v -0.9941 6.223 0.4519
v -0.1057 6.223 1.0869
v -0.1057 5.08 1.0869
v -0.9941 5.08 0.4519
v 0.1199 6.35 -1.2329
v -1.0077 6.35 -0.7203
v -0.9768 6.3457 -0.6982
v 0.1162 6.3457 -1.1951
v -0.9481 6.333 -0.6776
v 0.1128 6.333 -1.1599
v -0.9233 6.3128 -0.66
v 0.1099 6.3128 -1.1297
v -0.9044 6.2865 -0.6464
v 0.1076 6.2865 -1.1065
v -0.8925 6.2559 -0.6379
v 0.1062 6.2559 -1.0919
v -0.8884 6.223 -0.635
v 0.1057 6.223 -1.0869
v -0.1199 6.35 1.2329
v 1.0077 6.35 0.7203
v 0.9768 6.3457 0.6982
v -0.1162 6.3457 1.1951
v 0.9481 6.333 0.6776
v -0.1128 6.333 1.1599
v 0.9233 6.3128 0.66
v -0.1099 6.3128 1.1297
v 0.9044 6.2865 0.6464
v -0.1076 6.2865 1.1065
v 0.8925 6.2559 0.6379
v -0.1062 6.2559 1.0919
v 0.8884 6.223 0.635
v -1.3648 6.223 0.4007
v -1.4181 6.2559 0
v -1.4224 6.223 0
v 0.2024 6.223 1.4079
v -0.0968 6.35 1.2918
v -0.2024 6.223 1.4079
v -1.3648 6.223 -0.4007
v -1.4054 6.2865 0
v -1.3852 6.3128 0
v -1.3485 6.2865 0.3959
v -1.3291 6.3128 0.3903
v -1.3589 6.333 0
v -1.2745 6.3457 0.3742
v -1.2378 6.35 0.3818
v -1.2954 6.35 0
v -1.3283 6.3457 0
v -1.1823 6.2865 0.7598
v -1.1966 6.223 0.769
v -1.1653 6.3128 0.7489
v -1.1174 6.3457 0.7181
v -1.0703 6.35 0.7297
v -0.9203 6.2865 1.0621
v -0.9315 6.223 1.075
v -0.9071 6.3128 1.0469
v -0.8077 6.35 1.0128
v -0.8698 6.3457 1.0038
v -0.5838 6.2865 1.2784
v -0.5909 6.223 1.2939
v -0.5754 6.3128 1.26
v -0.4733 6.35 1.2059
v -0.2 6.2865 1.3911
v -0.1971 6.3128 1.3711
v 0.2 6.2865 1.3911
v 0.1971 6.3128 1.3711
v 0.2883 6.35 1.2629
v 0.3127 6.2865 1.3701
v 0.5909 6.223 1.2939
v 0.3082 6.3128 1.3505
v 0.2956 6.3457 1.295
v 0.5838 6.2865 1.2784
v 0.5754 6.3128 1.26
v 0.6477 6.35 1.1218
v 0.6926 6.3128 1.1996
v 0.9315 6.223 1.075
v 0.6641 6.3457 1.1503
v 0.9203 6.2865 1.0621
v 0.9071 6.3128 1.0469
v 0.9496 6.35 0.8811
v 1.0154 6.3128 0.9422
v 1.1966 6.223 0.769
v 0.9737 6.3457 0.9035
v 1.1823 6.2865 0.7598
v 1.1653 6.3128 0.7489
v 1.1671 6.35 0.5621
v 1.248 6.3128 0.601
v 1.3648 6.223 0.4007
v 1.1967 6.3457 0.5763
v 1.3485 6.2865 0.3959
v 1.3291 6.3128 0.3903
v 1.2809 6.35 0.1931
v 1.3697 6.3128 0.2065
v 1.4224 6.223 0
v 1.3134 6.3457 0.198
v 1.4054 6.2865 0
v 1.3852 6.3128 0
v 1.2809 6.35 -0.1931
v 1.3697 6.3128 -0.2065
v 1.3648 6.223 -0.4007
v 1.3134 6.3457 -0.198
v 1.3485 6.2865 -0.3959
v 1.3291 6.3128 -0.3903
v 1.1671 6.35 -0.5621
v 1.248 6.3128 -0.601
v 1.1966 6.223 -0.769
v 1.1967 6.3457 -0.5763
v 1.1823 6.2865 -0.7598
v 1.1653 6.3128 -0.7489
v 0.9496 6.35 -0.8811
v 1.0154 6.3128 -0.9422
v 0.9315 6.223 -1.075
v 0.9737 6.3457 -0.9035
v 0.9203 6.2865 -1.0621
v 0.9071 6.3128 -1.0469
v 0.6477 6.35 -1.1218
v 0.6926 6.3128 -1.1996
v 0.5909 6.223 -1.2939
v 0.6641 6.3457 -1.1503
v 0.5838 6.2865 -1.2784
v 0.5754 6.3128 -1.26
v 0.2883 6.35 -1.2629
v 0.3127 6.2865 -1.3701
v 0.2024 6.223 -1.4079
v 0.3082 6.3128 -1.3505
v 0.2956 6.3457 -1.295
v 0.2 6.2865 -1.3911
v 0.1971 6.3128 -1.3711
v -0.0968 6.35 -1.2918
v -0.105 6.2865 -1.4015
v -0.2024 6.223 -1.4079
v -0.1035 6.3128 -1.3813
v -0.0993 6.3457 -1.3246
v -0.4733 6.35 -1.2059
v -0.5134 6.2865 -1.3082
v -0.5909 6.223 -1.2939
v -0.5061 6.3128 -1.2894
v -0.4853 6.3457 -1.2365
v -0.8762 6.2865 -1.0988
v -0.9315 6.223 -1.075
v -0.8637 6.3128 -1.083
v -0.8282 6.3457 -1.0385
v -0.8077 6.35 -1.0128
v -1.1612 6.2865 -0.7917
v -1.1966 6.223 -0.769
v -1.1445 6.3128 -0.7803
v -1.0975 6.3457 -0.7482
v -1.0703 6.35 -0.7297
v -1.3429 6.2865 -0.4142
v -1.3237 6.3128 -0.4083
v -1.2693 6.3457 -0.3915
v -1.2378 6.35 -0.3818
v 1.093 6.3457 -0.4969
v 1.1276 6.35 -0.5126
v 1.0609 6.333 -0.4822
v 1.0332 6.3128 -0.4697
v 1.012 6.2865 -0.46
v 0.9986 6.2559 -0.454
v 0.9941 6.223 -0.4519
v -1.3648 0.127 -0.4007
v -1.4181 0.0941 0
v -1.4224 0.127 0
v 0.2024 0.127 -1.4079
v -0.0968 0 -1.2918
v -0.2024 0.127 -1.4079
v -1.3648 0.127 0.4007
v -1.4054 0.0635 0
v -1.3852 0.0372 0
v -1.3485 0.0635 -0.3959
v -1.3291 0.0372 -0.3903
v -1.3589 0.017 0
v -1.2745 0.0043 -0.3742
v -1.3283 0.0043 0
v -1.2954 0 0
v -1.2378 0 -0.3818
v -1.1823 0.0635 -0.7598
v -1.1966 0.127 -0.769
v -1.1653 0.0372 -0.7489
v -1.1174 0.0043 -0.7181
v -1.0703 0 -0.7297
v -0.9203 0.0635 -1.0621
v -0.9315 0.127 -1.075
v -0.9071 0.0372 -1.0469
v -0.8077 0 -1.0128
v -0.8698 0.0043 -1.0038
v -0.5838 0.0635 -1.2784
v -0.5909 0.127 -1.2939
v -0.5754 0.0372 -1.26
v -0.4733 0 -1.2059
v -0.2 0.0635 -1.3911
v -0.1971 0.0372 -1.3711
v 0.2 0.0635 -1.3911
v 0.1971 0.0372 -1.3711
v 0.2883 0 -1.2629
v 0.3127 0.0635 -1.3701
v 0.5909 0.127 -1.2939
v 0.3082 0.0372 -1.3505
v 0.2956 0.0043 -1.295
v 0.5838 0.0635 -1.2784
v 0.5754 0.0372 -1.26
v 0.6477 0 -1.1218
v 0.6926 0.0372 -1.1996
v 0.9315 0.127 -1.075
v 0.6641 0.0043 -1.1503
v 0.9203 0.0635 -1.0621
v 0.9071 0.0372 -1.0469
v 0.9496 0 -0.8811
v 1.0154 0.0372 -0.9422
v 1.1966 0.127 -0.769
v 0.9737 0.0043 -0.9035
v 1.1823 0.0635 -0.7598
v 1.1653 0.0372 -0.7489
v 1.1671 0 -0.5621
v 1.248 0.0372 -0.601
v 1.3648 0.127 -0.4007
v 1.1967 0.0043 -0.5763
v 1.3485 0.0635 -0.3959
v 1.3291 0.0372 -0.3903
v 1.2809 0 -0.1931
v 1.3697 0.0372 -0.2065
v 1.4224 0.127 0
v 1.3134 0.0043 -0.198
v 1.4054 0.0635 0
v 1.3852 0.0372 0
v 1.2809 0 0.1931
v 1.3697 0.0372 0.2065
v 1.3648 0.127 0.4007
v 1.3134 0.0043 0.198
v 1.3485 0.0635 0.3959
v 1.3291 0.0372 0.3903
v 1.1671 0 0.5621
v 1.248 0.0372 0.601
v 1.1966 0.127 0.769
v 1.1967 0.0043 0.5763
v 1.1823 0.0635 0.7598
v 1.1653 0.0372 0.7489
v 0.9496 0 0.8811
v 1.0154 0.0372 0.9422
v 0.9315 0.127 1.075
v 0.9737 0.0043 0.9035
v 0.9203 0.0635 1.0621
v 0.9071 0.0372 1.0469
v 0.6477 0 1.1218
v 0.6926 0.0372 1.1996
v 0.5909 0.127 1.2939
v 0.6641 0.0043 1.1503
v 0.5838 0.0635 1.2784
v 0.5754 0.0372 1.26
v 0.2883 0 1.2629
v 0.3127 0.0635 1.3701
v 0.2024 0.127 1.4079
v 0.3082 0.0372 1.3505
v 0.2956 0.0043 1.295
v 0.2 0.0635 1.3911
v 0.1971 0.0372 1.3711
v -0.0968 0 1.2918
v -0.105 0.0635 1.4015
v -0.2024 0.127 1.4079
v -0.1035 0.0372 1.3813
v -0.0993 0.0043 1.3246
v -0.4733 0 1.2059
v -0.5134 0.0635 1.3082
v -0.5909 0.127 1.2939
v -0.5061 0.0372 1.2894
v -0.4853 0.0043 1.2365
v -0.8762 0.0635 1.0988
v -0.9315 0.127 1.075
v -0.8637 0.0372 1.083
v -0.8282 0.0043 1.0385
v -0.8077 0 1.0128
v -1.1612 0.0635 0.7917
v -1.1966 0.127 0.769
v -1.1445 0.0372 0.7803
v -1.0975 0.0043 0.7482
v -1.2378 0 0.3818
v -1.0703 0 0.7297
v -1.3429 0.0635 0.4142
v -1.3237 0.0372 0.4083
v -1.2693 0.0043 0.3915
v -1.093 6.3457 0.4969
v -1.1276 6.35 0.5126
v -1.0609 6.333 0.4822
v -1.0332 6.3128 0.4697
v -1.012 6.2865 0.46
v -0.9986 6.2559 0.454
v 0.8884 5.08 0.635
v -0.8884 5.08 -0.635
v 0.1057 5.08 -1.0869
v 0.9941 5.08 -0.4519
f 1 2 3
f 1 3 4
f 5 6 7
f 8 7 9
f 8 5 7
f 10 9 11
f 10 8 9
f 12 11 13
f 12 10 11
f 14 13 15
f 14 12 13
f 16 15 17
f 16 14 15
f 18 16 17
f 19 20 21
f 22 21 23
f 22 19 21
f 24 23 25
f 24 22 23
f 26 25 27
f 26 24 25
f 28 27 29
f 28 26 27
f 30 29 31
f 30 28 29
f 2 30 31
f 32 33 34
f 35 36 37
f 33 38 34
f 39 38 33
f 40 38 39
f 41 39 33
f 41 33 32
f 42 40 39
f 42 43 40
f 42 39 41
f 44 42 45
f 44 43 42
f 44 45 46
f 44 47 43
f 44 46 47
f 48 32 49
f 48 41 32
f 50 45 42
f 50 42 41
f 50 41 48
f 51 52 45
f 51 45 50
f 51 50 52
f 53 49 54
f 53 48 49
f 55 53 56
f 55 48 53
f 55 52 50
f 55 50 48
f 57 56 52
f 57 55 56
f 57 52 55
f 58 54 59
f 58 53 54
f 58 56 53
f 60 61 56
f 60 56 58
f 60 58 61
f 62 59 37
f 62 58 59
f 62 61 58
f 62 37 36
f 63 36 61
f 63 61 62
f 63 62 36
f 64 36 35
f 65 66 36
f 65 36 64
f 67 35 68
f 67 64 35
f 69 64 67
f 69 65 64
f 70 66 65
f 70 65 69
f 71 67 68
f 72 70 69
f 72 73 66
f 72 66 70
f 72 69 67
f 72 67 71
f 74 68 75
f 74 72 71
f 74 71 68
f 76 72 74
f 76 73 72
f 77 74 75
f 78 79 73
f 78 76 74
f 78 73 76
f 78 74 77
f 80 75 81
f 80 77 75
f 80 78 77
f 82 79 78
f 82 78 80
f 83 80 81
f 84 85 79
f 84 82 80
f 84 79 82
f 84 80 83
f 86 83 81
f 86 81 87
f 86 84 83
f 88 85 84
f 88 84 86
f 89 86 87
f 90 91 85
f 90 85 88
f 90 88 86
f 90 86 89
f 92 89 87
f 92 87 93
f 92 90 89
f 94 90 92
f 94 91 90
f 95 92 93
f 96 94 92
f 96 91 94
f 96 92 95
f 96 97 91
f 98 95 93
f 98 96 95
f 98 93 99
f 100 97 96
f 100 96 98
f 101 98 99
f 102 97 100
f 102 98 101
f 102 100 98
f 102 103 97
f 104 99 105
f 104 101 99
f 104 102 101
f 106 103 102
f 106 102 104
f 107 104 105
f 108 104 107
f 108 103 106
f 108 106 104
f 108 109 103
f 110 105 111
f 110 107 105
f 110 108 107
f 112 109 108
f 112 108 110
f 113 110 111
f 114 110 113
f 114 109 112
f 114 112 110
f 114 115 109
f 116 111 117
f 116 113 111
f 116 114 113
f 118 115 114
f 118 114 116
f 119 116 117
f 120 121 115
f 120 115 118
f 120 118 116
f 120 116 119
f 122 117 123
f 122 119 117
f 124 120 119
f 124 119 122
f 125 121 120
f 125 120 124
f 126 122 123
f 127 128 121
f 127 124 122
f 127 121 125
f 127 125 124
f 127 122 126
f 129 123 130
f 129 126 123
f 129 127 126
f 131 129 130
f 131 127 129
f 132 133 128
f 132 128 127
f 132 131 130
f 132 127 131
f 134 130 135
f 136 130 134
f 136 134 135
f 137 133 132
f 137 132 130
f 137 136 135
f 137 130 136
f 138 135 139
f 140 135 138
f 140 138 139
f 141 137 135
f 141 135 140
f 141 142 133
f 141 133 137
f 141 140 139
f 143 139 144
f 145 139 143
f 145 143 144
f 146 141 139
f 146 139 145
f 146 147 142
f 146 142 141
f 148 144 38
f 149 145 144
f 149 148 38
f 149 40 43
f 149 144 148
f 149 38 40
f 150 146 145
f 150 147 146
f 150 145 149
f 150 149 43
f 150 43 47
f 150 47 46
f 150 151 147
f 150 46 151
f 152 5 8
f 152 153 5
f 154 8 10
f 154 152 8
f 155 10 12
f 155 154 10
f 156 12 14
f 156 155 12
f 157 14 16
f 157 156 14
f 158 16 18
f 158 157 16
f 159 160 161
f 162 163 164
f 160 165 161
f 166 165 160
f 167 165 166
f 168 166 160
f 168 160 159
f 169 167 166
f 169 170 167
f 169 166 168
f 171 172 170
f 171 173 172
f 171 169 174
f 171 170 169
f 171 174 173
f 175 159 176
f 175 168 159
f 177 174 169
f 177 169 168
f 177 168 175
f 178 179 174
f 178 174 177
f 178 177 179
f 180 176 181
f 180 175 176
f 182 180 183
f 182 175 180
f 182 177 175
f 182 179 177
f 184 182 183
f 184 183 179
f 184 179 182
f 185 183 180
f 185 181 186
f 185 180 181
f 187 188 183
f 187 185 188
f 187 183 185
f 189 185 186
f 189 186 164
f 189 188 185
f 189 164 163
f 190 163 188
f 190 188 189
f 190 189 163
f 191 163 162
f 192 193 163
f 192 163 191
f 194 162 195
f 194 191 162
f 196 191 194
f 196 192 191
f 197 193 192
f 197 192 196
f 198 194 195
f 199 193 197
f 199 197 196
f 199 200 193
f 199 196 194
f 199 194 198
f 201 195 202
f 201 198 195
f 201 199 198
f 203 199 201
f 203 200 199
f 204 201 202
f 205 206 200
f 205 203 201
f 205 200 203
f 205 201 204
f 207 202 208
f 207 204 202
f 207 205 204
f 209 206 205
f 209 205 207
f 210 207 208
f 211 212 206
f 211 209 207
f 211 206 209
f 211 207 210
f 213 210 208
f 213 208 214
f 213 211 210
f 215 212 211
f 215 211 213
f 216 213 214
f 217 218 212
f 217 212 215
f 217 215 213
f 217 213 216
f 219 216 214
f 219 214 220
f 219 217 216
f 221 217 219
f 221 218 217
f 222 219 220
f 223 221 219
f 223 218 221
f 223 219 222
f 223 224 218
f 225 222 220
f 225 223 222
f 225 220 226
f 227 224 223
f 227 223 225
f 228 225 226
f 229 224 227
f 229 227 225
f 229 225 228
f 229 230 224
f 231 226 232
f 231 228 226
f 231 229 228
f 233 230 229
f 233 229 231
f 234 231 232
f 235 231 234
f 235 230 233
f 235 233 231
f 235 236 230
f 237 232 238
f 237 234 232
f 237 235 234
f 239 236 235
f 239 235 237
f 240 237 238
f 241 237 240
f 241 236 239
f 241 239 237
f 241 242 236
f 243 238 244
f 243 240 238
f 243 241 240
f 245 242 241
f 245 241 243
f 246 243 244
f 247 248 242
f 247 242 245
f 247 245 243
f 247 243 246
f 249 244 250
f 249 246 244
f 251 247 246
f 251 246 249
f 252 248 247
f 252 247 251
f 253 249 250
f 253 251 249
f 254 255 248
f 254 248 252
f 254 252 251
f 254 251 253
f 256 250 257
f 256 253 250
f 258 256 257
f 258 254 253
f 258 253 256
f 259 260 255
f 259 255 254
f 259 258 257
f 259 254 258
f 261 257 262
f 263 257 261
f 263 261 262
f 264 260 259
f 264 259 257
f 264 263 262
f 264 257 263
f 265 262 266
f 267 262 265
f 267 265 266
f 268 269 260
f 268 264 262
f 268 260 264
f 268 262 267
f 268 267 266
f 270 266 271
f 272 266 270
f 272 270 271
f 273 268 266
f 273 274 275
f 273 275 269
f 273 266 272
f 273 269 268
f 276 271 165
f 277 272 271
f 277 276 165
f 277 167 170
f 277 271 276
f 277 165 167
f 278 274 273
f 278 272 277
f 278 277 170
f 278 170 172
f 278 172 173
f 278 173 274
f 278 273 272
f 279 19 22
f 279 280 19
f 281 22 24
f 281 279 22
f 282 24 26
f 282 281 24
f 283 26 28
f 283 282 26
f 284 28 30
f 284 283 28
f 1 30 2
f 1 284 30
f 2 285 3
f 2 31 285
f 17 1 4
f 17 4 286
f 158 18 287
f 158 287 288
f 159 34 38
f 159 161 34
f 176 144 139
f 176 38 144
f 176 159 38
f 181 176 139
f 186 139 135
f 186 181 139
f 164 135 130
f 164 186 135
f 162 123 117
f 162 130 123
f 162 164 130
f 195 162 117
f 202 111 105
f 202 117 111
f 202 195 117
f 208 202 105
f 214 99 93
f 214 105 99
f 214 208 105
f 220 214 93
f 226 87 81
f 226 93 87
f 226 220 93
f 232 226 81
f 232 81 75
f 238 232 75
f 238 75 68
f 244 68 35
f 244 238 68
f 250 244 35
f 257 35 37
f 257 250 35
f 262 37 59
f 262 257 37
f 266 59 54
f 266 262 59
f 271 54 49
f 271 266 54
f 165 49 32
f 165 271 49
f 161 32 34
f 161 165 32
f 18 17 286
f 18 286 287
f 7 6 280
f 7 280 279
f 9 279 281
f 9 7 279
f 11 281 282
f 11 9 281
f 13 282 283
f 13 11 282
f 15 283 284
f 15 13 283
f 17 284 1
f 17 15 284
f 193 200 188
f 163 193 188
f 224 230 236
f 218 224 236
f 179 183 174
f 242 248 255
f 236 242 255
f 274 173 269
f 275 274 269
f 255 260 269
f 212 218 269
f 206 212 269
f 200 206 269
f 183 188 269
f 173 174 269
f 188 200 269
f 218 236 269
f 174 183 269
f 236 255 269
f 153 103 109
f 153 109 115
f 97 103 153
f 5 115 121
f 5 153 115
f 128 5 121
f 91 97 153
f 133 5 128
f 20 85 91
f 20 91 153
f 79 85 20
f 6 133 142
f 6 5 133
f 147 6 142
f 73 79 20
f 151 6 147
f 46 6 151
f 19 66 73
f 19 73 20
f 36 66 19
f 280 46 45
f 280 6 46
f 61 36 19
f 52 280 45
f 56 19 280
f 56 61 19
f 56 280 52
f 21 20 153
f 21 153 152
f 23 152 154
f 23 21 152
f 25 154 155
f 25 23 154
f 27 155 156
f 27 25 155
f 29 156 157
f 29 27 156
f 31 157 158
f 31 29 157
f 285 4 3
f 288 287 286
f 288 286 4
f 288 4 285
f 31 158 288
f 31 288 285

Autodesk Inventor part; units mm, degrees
ref_plane "YZ Plane" through (0, 0, 0) normal (1, 0, 0) x (0, 1, 0)
ref_plane "XZ Plane" through (0, 0, 0) normal (0, 1, 0) x (-1, 0, 0)
ref_plane "XY Plane" through (0, 0, 0) normal (0, 0, 1) x (1, 0, 0)
sketch "Sketch4" plane through (0, 0, 0) normal (0, 1, 0) x (-1, 0, 0)
  circle A0 centre (0, 0) radius 1.4224
  dimension "d14" = 2.8448
extrude "Extrusion4" add sketch "Sketch4" along normal blind 6.35
thread "Thread2" size "4-40 UNC" class "2A" standard "ANSI Unified Screw Threads" full length
fillet "Fillet1" radius 0.127 1 edges at (1.4224, 0, 0)
sketch "Sketch5" plane through (0, 6.35, 0) normal (0, 1, 0) x (1, 0, 0)
  line L0 (-0.8884, 0.635) -> (0.1057, 1.0869)
  line L1 (0.1057, 1.0869) -> (0.9941, 0.4519)
  line L2 (0.9941, 0.4519) -> (0.8884, -0.635)
  line L3 (0.8884, -0.635) -> (-0.1057, -1.0869)
  line L4 (-0.1057, -1.0869) -> (-0.9941, -0.4519)
  line L5 (-0.9941, -0.4519) -> (-0.8884, 0.635)
  point P0 (0, 0)
  point P1 (0, 0)
  dimension "d20" = 1.27
extrude "Extrusion5" cut sketch "Sketch5" against normal blind 1.27
fillet "Fillet2" radius 0.127 1 edges at (1.4224, 6.35, 0)
fillet "Fillet3" radius 0.127 6 edges at (0.5499, 6.35, -0.7694) (0.9412, 6.35, 0.0916) (0.3913, 6.35, 0.8609) (-0.5499, 6.35, 0.7694) (-0.9412, 6.35, -0.0916) (-0.3913, 6.35, -0.8609)
properties part number "4_40_hex_cap_screw"
